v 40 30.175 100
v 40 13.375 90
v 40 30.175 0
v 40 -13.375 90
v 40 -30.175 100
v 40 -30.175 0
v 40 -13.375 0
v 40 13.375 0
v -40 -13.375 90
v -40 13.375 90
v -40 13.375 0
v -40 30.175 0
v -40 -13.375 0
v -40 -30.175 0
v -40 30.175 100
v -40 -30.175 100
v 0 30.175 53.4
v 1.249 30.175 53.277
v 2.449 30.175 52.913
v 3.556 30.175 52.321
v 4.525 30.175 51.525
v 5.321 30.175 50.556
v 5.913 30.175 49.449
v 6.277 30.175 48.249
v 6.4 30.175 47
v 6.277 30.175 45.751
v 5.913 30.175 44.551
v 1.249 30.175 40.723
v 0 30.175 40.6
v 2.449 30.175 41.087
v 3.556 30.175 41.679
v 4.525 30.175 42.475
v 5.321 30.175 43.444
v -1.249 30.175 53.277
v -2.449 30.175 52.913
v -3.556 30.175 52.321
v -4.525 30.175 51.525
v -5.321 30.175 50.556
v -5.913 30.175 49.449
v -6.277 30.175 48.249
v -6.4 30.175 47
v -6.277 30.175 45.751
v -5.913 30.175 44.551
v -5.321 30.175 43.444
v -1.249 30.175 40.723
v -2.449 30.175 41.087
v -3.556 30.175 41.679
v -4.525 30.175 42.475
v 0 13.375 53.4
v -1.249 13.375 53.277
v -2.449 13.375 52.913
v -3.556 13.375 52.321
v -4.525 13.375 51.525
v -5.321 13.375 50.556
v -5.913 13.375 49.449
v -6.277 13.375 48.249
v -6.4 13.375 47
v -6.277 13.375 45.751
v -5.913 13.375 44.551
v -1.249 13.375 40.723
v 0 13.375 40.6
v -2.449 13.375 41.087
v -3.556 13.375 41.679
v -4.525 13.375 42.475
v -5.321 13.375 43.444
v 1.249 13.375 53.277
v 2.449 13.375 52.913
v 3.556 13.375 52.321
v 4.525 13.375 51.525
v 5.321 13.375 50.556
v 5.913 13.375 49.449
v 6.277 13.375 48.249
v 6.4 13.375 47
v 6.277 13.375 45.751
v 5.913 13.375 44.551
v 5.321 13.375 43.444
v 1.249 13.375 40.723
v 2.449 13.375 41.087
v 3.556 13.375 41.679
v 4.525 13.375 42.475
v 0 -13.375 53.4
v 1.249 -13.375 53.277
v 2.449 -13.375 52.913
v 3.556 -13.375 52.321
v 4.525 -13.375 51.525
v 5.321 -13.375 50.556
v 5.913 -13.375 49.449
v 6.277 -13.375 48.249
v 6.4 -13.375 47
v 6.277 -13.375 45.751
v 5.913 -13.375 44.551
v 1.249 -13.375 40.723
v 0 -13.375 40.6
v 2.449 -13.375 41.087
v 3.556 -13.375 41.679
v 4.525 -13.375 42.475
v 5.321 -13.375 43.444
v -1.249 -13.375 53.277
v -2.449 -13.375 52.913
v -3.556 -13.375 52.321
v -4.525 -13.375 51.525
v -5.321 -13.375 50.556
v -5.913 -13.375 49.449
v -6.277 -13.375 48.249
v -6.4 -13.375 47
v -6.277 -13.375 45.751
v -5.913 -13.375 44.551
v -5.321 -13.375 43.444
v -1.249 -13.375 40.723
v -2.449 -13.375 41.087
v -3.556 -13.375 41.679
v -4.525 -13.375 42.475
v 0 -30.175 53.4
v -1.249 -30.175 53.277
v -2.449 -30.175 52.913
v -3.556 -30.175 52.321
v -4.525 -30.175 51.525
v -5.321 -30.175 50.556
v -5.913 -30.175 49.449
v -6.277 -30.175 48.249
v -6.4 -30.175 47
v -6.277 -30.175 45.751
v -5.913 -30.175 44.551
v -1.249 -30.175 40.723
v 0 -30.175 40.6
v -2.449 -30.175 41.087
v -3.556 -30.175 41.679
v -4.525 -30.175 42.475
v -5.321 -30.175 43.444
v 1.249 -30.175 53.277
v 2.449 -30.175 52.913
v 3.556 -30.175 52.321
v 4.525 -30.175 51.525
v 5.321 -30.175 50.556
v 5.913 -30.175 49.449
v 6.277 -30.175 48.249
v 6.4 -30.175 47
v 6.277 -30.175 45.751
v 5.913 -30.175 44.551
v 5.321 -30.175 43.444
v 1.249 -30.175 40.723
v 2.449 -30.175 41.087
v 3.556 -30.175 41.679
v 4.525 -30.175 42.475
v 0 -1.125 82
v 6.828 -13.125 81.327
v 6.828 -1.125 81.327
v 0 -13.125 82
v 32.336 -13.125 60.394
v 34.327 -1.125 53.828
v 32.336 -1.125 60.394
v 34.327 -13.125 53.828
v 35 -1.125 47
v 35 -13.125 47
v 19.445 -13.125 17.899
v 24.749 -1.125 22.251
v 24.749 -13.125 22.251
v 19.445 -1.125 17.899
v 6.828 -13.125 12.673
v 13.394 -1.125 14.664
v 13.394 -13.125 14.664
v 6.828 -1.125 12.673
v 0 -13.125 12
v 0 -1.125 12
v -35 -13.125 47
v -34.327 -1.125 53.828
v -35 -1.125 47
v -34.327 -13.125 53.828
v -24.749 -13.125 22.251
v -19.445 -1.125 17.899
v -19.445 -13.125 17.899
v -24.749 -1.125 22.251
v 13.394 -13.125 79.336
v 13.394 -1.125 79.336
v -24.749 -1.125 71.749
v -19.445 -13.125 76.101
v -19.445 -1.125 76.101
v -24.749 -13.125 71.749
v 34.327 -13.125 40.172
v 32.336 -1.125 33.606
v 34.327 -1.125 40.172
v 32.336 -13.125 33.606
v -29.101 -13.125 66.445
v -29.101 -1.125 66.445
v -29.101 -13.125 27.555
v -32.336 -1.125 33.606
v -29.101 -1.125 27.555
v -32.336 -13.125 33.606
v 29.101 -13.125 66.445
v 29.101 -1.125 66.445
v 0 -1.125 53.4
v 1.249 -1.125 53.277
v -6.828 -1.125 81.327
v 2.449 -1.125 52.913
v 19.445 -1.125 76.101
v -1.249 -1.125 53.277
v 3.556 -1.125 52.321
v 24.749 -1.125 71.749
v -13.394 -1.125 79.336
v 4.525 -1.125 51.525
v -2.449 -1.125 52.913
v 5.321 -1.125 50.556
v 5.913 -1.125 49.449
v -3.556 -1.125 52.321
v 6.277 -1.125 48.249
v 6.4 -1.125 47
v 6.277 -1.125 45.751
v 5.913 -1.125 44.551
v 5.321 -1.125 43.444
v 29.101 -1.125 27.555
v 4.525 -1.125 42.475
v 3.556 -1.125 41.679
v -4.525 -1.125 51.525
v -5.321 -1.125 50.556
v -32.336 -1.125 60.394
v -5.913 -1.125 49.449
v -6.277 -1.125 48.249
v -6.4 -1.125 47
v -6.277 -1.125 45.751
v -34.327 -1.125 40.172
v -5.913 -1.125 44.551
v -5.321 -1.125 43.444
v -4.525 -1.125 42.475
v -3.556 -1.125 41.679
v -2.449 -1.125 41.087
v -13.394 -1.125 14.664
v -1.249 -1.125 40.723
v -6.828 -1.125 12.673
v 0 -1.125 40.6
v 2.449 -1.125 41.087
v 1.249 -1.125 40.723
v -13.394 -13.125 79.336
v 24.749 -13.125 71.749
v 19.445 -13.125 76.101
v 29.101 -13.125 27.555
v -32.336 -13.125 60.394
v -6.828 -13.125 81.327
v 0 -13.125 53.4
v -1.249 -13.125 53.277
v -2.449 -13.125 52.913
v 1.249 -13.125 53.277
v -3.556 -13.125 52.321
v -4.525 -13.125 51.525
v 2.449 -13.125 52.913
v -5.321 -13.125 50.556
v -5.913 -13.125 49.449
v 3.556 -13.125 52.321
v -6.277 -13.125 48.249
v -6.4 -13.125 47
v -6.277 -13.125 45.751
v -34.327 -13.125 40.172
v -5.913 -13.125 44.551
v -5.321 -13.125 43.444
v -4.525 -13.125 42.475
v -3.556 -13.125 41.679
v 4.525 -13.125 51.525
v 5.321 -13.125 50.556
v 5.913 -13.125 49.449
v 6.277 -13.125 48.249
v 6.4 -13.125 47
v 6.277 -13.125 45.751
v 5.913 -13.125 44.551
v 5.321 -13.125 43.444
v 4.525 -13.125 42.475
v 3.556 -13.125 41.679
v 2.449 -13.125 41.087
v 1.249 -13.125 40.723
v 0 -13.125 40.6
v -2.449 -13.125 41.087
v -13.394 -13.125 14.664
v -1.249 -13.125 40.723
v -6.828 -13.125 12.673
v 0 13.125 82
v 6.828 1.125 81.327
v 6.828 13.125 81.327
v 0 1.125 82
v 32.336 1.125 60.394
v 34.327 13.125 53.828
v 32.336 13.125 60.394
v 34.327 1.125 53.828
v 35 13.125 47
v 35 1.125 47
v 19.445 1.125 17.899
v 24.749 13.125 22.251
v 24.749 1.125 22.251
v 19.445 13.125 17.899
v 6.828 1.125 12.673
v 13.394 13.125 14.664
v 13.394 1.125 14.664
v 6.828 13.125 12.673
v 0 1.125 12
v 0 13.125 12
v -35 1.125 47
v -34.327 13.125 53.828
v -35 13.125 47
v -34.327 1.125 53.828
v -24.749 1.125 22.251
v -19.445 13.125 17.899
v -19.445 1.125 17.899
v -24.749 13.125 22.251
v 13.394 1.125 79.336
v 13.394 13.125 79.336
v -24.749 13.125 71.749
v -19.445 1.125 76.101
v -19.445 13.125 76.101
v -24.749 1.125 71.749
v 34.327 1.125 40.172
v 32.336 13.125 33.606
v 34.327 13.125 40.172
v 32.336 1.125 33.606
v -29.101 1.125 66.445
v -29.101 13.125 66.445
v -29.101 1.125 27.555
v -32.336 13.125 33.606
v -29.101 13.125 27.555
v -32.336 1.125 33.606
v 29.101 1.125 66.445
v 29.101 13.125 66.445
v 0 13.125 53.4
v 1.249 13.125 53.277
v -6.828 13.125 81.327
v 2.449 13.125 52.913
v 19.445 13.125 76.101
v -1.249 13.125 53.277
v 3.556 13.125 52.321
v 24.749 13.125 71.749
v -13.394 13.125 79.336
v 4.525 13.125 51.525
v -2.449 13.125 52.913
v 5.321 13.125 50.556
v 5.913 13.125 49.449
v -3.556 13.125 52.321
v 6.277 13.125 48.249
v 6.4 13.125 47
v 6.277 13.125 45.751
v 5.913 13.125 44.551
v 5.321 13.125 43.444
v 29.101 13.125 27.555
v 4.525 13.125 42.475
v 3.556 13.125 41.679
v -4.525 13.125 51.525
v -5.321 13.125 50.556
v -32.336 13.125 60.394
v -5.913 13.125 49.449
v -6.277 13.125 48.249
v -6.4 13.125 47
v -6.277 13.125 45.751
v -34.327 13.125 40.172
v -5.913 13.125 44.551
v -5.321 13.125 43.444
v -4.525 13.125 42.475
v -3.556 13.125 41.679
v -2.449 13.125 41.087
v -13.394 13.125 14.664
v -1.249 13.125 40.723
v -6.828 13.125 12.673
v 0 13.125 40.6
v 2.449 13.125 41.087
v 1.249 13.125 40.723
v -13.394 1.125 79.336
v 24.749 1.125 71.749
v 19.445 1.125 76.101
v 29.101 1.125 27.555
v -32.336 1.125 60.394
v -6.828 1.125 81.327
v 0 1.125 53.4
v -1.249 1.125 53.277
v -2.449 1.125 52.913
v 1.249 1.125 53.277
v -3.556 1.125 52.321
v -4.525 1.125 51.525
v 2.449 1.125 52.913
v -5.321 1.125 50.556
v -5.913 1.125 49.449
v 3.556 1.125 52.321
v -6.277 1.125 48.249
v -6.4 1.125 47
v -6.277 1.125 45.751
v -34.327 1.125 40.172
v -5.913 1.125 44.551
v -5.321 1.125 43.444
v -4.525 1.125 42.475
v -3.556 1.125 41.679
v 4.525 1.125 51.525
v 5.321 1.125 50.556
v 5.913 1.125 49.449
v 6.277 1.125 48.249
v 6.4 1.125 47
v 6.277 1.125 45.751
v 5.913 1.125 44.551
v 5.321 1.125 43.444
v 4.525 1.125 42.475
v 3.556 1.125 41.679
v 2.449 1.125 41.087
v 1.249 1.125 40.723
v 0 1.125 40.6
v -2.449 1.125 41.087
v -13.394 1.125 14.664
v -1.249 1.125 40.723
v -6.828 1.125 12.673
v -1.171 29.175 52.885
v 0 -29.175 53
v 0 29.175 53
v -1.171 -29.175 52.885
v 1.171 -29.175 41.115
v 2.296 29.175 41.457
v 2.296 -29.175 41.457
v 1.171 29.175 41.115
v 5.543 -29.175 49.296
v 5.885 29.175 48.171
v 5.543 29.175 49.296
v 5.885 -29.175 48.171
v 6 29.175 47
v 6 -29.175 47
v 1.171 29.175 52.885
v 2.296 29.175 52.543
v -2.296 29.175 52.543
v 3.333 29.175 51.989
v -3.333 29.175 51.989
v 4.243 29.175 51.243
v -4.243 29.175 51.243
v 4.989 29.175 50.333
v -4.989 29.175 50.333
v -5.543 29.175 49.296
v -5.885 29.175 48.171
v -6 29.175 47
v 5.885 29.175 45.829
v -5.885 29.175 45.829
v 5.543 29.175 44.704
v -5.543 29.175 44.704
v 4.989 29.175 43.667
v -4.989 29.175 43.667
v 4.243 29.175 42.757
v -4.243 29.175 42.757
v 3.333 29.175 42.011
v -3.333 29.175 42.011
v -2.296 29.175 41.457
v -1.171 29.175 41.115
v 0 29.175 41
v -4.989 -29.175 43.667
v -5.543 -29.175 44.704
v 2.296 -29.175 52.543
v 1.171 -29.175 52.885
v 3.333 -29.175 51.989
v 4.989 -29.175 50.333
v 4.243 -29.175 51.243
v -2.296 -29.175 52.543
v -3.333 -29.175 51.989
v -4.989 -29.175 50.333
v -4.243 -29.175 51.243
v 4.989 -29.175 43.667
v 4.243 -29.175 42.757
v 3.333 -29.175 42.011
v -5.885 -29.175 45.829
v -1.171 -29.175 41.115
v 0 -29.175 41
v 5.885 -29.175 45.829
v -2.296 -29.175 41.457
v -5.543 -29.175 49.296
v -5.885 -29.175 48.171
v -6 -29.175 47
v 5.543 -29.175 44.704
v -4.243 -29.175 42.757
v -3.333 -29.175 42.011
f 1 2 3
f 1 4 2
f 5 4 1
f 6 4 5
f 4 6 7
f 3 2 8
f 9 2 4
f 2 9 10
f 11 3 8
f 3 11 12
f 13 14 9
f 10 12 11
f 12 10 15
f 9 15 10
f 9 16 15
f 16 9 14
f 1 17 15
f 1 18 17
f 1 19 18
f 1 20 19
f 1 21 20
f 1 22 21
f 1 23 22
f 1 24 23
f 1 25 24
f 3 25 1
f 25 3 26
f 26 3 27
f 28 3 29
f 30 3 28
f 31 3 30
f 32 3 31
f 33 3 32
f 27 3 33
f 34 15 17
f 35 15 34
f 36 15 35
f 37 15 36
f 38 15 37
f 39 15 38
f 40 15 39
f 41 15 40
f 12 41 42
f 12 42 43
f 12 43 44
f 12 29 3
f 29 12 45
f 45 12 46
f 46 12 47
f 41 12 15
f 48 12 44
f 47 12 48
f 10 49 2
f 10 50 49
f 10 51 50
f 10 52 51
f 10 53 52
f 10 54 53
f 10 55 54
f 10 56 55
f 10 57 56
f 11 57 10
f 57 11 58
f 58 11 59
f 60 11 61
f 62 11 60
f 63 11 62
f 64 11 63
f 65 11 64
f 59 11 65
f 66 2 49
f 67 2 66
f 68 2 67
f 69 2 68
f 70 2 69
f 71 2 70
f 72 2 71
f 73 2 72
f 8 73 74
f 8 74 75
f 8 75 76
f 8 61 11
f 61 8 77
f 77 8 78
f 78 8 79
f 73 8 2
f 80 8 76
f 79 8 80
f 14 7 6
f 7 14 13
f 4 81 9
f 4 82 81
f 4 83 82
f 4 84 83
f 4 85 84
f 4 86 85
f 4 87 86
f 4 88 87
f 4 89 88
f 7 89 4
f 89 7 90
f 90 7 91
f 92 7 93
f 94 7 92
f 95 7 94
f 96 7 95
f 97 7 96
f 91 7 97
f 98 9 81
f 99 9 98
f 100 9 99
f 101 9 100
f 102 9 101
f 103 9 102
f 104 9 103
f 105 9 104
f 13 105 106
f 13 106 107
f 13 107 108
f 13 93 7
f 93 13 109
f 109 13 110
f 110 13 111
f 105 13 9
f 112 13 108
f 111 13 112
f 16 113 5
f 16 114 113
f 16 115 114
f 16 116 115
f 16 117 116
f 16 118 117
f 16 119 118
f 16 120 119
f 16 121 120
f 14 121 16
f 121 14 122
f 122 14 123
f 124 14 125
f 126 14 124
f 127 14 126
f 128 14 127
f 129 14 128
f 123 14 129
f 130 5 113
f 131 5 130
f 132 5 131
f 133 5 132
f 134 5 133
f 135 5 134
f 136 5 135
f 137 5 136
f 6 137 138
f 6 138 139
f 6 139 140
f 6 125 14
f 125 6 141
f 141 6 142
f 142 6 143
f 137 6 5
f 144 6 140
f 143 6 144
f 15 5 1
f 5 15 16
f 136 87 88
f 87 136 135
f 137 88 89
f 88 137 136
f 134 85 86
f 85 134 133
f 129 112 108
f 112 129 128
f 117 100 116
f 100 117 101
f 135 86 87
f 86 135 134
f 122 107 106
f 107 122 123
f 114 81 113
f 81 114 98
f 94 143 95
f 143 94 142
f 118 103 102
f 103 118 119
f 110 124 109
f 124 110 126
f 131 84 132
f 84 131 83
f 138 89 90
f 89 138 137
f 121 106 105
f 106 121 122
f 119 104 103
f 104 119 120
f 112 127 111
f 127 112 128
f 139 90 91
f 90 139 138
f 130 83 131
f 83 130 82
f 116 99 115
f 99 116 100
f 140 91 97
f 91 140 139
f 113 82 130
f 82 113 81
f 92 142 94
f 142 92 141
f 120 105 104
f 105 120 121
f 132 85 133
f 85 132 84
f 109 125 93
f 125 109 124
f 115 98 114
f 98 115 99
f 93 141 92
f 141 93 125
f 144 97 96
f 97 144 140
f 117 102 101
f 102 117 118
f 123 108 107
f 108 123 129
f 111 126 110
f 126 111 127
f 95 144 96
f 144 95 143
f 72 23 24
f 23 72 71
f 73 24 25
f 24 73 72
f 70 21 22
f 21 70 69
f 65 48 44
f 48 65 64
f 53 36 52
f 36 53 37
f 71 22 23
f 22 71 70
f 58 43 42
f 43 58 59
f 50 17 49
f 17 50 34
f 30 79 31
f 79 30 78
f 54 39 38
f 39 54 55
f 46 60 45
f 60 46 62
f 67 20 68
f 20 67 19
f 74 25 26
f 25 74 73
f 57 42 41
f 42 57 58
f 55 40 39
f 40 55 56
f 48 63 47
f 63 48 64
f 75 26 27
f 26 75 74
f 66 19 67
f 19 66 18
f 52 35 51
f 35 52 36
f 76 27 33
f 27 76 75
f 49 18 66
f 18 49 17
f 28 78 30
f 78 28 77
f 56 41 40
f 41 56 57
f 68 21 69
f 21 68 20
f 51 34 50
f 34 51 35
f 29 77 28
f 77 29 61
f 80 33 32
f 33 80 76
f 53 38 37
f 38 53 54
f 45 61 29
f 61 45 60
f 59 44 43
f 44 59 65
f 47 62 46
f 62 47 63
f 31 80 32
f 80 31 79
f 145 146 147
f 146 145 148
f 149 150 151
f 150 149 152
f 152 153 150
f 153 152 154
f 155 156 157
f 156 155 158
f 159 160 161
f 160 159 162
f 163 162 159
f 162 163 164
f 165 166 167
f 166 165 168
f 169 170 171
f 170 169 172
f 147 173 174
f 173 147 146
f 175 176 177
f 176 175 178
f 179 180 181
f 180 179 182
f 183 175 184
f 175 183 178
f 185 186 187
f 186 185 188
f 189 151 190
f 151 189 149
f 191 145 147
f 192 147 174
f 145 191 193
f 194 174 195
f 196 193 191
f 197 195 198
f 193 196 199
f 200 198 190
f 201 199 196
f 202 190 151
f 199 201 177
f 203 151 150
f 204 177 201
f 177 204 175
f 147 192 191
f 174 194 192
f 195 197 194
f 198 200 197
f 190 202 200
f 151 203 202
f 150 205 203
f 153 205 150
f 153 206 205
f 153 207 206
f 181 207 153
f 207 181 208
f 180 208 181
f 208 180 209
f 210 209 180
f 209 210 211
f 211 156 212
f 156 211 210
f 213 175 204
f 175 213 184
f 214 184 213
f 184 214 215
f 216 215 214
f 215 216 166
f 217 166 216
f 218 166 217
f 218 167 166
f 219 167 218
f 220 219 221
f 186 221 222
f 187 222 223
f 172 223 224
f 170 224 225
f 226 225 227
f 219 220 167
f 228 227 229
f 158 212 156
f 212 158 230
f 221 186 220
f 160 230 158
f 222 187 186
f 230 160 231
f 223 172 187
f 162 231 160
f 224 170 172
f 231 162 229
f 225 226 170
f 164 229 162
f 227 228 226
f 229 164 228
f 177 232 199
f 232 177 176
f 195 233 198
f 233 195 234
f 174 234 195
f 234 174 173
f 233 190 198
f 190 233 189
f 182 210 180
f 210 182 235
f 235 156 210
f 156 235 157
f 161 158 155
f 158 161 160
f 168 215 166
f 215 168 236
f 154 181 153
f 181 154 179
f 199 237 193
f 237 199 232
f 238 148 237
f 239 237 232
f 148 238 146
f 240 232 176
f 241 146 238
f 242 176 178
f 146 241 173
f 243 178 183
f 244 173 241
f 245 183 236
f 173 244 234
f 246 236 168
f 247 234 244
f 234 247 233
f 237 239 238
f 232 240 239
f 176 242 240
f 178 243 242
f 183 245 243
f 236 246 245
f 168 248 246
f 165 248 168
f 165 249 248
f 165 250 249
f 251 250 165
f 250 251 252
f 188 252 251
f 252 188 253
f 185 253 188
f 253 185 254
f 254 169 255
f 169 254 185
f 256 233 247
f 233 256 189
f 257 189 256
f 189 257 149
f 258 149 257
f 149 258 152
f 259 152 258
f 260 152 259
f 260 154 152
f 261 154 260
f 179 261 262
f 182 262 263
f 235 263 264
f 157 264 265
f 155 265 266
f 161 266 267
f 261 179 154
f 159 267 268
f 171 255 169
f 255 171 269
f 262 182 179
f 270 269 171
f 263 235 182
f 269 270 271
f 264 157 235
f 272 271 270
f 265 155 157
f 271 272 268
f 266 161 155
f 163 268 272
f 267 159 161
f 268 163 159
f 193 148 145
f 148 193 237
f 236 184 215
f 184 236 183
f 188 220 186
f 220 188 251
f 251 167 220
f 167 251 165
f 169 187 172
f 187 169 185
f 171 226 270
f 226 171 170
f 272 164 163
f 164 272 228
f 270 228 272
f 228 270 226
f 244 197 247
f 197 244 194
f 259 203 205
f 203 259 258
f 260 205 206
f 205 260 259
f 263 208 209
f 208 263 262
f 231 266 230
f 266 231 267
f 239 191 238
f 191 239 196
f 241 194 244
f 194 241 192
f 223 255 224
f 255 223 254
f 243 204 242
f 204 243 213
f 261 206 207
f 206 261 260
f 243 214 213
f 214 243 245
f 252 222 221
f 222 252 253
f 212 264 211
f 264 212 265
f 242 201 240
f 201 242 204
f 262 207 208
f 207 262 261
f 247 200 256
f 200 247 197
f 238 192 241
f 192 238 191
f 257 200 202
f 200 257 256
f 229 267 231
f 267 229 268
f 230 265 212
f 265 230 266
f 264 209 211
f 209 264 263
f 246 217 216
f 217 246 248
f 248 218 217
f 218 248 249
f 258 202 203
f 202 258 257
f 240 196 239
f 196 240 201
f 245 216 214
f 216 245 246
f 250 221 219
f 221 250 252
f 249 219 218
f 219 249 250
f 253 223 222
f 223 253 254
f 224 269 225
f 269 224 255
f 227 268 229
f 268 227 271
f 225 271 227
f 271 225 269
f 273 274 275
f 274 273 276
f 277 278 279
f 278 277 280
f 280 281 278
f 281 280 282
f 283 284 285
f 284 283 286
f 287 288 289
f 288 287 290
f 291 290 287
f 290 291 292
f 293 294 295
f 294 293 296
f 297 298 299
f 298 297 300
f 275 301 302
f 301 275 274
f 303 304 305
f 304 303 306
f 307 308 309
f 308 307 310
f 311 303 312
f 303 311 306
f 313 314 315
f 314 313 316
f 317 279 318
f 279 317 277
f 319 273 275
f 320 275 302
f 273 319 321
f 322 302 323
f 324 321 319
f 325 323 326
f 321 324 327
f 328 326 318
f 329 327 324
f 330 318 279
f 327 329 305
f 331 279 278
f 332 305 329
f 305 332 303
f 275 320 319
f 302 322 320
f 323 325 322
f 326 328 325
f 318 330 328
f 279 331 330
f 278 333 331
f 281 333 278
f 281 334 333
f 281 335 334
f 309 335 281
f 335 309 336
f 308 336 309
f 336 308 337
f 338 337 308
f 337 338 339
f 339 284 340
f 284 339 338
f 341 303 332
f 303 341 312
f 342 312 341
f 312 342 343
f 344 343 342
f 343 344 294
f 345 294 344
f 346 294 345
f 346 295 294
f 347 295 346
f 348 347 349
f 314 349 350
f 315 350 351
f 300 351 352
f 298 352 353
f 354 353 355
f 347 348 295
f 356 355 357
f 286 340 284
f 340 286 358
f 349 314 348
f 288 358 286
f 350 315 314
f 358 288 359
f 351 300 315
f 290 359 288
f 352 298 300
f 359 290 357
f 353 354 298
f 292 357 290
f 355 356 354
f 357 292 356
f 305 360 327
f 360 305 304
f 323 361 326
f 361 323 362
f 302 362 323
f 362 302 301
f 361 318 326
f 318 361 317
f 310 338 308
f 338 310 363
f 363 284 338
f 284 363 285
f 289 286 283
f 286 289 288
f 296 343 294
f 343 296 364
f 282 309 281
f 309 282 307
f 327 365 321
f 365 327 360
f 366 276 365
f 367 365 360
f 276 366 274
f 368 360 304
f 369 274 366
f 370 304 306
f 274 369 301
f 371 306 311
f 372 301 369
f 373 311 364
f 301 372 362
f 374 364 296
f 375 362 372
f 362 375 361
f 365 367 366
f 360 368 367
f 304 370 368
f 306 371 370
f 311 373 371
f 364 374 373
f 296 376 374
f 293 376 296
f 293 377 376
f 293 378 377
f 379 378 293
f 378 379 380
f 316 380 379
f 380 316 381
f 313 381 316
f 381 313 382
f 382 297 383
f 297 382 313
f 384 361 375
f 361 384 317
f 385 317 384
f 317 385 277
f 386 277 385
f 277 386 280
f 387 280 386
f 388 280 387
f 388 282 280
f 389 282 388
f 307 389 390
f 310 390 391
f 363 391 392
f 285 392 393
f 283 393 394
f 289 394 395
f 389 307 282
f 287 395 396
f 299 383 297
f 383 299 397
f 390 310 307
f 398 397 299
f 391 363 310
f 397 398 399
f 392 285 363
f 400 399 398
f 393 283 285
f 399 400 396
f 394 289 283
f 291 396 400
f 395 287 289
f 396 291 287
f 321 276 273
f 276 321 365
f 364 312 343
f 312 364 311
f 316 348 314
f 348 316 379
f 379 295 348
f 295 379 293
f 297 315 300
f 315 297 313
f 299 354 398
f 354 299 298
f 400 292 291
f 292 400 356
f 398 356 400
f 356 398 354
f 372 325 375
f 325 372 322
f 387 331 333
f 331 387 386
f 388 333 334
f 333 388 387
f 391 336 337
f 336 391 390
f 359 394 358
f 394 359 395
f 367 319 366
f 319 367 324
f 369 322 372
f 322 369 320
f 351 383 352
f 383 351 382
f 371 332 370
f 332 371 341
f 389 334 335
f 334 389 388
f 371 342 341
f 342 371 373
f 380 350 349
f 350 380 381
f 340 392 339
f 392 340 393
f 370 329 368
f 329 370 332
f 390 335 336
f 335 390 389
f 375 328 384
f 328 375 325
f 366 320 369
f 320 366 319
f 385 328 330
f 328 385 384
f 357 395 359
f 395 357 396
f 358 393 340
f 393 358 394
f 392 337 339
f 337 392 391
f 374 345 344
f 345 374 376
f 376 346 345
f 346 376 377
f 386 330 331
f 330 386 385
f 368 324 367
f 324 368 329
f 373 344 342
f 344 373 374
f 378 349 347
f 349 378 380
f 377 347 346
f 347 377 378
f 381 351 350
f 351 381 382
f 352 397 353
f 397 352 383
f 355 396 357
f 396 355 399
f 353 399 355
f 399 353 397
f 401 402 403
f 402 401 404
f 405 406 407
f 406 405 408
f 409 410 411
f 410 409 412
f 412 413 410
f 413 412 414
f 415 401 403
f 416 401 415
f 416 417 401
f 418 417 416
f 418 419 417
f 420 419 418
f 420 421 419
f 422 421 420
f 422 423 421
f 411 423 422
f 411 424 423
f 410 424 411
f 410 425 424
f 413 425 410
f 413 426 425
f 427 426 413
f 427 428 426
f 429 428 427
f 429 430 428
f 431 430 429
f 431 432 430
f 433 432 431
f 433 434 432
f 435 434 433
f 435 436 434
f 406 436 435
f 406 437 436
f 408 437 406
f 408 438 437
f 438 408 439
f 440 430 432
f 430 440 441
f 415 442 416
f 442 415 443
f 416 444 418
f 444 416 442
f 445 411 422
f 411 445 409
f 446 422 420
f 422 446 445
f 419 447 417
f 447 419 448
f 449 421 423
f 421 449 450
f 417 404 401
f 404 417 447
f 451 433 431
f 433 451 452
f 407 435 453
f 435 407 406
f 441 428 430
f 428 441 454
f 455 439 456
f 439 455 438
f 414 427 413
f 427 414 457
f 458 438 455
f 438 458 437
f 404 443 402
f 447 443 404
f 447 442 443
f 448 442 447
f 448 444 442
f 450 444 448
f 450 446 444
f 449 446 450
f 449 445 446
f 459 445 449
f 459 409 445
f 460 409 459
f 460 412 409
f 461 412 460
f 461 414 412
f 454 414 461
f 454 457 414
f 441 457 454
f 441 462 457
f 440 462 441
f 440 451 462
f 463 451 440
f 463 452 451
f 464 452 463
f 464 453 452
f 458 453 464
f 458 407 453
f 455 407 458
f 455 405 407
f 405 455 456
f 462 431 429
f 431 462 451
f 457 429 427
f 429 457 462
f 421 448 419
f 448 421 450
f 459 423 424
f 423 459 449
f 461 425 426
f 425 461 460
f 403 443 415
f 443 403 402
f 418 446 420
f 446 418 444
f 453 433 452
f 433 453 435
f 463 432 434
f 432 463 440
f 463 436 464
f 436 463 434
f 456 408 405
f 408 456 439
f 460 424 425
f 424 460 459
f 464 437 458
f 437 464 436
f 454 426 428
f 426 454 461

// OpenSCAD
$fn = 32;

// ------------------------------------------------------------------------
// Trolley wheel set: wheels d70, fork 90 mm tall
// Every part is its own module, assembly() places every instance.
// ------------------------------------------------------------------------

// --- part 1 ---
module trolley_fork() {
  difference() {
    union() {
      translate([-40, 13.375, 0]) cube([80, 16.8, 90]);
      translate([-40, -30.175, 0]) cube([80, 16.8, 90]);
      translate([-40, -30.175, 90]) cube([80, 60.35, 10]);
    }
    translate([0, -21.775, 47]) rotate([90, 0, 0]) cylinder(h = 18.8, d = 12.8, center = true);
    translate([0, 21.775, 47]) rotate([90, 0, 0]) cylinder(h = 18.8, d = 12.8, center = true);
  }
}

// --- part 2 ---
module trolley_wheel() {
  difference() {
      translate([0, 0, 0]) cylinder(h = 12, d = 70);
      translate([0, 0, -1]) cylinder(h = 14, d = 12.8);
    }
}

// --- part 3 ---
module trolley_axle() {
  translate([0, 0, -29.175]) cylinder(h = 58.35, d = 12);
}

// --- assembly ---
module assembly() {
  color([0.80, 0.24, 0.20]) translate([0, 0, 0]) rotate([0, 0, 0]) trolley_fork();
  color([0.20, 0.45, 0.75]) translate([0, -1.125, 47]) rotate([90, 0, 0]) trolley_wheel();
  color([0.25, 0.62, 0.32]) translate([0, 13.125, 47]) rotate([90, 0, 0]) trolley_wheel();
  color([0.92, 0.70, 0.18]) translate([0, 0, 47]) rotate([90, 0, 0]) trolley_axle();
}

assembly();
